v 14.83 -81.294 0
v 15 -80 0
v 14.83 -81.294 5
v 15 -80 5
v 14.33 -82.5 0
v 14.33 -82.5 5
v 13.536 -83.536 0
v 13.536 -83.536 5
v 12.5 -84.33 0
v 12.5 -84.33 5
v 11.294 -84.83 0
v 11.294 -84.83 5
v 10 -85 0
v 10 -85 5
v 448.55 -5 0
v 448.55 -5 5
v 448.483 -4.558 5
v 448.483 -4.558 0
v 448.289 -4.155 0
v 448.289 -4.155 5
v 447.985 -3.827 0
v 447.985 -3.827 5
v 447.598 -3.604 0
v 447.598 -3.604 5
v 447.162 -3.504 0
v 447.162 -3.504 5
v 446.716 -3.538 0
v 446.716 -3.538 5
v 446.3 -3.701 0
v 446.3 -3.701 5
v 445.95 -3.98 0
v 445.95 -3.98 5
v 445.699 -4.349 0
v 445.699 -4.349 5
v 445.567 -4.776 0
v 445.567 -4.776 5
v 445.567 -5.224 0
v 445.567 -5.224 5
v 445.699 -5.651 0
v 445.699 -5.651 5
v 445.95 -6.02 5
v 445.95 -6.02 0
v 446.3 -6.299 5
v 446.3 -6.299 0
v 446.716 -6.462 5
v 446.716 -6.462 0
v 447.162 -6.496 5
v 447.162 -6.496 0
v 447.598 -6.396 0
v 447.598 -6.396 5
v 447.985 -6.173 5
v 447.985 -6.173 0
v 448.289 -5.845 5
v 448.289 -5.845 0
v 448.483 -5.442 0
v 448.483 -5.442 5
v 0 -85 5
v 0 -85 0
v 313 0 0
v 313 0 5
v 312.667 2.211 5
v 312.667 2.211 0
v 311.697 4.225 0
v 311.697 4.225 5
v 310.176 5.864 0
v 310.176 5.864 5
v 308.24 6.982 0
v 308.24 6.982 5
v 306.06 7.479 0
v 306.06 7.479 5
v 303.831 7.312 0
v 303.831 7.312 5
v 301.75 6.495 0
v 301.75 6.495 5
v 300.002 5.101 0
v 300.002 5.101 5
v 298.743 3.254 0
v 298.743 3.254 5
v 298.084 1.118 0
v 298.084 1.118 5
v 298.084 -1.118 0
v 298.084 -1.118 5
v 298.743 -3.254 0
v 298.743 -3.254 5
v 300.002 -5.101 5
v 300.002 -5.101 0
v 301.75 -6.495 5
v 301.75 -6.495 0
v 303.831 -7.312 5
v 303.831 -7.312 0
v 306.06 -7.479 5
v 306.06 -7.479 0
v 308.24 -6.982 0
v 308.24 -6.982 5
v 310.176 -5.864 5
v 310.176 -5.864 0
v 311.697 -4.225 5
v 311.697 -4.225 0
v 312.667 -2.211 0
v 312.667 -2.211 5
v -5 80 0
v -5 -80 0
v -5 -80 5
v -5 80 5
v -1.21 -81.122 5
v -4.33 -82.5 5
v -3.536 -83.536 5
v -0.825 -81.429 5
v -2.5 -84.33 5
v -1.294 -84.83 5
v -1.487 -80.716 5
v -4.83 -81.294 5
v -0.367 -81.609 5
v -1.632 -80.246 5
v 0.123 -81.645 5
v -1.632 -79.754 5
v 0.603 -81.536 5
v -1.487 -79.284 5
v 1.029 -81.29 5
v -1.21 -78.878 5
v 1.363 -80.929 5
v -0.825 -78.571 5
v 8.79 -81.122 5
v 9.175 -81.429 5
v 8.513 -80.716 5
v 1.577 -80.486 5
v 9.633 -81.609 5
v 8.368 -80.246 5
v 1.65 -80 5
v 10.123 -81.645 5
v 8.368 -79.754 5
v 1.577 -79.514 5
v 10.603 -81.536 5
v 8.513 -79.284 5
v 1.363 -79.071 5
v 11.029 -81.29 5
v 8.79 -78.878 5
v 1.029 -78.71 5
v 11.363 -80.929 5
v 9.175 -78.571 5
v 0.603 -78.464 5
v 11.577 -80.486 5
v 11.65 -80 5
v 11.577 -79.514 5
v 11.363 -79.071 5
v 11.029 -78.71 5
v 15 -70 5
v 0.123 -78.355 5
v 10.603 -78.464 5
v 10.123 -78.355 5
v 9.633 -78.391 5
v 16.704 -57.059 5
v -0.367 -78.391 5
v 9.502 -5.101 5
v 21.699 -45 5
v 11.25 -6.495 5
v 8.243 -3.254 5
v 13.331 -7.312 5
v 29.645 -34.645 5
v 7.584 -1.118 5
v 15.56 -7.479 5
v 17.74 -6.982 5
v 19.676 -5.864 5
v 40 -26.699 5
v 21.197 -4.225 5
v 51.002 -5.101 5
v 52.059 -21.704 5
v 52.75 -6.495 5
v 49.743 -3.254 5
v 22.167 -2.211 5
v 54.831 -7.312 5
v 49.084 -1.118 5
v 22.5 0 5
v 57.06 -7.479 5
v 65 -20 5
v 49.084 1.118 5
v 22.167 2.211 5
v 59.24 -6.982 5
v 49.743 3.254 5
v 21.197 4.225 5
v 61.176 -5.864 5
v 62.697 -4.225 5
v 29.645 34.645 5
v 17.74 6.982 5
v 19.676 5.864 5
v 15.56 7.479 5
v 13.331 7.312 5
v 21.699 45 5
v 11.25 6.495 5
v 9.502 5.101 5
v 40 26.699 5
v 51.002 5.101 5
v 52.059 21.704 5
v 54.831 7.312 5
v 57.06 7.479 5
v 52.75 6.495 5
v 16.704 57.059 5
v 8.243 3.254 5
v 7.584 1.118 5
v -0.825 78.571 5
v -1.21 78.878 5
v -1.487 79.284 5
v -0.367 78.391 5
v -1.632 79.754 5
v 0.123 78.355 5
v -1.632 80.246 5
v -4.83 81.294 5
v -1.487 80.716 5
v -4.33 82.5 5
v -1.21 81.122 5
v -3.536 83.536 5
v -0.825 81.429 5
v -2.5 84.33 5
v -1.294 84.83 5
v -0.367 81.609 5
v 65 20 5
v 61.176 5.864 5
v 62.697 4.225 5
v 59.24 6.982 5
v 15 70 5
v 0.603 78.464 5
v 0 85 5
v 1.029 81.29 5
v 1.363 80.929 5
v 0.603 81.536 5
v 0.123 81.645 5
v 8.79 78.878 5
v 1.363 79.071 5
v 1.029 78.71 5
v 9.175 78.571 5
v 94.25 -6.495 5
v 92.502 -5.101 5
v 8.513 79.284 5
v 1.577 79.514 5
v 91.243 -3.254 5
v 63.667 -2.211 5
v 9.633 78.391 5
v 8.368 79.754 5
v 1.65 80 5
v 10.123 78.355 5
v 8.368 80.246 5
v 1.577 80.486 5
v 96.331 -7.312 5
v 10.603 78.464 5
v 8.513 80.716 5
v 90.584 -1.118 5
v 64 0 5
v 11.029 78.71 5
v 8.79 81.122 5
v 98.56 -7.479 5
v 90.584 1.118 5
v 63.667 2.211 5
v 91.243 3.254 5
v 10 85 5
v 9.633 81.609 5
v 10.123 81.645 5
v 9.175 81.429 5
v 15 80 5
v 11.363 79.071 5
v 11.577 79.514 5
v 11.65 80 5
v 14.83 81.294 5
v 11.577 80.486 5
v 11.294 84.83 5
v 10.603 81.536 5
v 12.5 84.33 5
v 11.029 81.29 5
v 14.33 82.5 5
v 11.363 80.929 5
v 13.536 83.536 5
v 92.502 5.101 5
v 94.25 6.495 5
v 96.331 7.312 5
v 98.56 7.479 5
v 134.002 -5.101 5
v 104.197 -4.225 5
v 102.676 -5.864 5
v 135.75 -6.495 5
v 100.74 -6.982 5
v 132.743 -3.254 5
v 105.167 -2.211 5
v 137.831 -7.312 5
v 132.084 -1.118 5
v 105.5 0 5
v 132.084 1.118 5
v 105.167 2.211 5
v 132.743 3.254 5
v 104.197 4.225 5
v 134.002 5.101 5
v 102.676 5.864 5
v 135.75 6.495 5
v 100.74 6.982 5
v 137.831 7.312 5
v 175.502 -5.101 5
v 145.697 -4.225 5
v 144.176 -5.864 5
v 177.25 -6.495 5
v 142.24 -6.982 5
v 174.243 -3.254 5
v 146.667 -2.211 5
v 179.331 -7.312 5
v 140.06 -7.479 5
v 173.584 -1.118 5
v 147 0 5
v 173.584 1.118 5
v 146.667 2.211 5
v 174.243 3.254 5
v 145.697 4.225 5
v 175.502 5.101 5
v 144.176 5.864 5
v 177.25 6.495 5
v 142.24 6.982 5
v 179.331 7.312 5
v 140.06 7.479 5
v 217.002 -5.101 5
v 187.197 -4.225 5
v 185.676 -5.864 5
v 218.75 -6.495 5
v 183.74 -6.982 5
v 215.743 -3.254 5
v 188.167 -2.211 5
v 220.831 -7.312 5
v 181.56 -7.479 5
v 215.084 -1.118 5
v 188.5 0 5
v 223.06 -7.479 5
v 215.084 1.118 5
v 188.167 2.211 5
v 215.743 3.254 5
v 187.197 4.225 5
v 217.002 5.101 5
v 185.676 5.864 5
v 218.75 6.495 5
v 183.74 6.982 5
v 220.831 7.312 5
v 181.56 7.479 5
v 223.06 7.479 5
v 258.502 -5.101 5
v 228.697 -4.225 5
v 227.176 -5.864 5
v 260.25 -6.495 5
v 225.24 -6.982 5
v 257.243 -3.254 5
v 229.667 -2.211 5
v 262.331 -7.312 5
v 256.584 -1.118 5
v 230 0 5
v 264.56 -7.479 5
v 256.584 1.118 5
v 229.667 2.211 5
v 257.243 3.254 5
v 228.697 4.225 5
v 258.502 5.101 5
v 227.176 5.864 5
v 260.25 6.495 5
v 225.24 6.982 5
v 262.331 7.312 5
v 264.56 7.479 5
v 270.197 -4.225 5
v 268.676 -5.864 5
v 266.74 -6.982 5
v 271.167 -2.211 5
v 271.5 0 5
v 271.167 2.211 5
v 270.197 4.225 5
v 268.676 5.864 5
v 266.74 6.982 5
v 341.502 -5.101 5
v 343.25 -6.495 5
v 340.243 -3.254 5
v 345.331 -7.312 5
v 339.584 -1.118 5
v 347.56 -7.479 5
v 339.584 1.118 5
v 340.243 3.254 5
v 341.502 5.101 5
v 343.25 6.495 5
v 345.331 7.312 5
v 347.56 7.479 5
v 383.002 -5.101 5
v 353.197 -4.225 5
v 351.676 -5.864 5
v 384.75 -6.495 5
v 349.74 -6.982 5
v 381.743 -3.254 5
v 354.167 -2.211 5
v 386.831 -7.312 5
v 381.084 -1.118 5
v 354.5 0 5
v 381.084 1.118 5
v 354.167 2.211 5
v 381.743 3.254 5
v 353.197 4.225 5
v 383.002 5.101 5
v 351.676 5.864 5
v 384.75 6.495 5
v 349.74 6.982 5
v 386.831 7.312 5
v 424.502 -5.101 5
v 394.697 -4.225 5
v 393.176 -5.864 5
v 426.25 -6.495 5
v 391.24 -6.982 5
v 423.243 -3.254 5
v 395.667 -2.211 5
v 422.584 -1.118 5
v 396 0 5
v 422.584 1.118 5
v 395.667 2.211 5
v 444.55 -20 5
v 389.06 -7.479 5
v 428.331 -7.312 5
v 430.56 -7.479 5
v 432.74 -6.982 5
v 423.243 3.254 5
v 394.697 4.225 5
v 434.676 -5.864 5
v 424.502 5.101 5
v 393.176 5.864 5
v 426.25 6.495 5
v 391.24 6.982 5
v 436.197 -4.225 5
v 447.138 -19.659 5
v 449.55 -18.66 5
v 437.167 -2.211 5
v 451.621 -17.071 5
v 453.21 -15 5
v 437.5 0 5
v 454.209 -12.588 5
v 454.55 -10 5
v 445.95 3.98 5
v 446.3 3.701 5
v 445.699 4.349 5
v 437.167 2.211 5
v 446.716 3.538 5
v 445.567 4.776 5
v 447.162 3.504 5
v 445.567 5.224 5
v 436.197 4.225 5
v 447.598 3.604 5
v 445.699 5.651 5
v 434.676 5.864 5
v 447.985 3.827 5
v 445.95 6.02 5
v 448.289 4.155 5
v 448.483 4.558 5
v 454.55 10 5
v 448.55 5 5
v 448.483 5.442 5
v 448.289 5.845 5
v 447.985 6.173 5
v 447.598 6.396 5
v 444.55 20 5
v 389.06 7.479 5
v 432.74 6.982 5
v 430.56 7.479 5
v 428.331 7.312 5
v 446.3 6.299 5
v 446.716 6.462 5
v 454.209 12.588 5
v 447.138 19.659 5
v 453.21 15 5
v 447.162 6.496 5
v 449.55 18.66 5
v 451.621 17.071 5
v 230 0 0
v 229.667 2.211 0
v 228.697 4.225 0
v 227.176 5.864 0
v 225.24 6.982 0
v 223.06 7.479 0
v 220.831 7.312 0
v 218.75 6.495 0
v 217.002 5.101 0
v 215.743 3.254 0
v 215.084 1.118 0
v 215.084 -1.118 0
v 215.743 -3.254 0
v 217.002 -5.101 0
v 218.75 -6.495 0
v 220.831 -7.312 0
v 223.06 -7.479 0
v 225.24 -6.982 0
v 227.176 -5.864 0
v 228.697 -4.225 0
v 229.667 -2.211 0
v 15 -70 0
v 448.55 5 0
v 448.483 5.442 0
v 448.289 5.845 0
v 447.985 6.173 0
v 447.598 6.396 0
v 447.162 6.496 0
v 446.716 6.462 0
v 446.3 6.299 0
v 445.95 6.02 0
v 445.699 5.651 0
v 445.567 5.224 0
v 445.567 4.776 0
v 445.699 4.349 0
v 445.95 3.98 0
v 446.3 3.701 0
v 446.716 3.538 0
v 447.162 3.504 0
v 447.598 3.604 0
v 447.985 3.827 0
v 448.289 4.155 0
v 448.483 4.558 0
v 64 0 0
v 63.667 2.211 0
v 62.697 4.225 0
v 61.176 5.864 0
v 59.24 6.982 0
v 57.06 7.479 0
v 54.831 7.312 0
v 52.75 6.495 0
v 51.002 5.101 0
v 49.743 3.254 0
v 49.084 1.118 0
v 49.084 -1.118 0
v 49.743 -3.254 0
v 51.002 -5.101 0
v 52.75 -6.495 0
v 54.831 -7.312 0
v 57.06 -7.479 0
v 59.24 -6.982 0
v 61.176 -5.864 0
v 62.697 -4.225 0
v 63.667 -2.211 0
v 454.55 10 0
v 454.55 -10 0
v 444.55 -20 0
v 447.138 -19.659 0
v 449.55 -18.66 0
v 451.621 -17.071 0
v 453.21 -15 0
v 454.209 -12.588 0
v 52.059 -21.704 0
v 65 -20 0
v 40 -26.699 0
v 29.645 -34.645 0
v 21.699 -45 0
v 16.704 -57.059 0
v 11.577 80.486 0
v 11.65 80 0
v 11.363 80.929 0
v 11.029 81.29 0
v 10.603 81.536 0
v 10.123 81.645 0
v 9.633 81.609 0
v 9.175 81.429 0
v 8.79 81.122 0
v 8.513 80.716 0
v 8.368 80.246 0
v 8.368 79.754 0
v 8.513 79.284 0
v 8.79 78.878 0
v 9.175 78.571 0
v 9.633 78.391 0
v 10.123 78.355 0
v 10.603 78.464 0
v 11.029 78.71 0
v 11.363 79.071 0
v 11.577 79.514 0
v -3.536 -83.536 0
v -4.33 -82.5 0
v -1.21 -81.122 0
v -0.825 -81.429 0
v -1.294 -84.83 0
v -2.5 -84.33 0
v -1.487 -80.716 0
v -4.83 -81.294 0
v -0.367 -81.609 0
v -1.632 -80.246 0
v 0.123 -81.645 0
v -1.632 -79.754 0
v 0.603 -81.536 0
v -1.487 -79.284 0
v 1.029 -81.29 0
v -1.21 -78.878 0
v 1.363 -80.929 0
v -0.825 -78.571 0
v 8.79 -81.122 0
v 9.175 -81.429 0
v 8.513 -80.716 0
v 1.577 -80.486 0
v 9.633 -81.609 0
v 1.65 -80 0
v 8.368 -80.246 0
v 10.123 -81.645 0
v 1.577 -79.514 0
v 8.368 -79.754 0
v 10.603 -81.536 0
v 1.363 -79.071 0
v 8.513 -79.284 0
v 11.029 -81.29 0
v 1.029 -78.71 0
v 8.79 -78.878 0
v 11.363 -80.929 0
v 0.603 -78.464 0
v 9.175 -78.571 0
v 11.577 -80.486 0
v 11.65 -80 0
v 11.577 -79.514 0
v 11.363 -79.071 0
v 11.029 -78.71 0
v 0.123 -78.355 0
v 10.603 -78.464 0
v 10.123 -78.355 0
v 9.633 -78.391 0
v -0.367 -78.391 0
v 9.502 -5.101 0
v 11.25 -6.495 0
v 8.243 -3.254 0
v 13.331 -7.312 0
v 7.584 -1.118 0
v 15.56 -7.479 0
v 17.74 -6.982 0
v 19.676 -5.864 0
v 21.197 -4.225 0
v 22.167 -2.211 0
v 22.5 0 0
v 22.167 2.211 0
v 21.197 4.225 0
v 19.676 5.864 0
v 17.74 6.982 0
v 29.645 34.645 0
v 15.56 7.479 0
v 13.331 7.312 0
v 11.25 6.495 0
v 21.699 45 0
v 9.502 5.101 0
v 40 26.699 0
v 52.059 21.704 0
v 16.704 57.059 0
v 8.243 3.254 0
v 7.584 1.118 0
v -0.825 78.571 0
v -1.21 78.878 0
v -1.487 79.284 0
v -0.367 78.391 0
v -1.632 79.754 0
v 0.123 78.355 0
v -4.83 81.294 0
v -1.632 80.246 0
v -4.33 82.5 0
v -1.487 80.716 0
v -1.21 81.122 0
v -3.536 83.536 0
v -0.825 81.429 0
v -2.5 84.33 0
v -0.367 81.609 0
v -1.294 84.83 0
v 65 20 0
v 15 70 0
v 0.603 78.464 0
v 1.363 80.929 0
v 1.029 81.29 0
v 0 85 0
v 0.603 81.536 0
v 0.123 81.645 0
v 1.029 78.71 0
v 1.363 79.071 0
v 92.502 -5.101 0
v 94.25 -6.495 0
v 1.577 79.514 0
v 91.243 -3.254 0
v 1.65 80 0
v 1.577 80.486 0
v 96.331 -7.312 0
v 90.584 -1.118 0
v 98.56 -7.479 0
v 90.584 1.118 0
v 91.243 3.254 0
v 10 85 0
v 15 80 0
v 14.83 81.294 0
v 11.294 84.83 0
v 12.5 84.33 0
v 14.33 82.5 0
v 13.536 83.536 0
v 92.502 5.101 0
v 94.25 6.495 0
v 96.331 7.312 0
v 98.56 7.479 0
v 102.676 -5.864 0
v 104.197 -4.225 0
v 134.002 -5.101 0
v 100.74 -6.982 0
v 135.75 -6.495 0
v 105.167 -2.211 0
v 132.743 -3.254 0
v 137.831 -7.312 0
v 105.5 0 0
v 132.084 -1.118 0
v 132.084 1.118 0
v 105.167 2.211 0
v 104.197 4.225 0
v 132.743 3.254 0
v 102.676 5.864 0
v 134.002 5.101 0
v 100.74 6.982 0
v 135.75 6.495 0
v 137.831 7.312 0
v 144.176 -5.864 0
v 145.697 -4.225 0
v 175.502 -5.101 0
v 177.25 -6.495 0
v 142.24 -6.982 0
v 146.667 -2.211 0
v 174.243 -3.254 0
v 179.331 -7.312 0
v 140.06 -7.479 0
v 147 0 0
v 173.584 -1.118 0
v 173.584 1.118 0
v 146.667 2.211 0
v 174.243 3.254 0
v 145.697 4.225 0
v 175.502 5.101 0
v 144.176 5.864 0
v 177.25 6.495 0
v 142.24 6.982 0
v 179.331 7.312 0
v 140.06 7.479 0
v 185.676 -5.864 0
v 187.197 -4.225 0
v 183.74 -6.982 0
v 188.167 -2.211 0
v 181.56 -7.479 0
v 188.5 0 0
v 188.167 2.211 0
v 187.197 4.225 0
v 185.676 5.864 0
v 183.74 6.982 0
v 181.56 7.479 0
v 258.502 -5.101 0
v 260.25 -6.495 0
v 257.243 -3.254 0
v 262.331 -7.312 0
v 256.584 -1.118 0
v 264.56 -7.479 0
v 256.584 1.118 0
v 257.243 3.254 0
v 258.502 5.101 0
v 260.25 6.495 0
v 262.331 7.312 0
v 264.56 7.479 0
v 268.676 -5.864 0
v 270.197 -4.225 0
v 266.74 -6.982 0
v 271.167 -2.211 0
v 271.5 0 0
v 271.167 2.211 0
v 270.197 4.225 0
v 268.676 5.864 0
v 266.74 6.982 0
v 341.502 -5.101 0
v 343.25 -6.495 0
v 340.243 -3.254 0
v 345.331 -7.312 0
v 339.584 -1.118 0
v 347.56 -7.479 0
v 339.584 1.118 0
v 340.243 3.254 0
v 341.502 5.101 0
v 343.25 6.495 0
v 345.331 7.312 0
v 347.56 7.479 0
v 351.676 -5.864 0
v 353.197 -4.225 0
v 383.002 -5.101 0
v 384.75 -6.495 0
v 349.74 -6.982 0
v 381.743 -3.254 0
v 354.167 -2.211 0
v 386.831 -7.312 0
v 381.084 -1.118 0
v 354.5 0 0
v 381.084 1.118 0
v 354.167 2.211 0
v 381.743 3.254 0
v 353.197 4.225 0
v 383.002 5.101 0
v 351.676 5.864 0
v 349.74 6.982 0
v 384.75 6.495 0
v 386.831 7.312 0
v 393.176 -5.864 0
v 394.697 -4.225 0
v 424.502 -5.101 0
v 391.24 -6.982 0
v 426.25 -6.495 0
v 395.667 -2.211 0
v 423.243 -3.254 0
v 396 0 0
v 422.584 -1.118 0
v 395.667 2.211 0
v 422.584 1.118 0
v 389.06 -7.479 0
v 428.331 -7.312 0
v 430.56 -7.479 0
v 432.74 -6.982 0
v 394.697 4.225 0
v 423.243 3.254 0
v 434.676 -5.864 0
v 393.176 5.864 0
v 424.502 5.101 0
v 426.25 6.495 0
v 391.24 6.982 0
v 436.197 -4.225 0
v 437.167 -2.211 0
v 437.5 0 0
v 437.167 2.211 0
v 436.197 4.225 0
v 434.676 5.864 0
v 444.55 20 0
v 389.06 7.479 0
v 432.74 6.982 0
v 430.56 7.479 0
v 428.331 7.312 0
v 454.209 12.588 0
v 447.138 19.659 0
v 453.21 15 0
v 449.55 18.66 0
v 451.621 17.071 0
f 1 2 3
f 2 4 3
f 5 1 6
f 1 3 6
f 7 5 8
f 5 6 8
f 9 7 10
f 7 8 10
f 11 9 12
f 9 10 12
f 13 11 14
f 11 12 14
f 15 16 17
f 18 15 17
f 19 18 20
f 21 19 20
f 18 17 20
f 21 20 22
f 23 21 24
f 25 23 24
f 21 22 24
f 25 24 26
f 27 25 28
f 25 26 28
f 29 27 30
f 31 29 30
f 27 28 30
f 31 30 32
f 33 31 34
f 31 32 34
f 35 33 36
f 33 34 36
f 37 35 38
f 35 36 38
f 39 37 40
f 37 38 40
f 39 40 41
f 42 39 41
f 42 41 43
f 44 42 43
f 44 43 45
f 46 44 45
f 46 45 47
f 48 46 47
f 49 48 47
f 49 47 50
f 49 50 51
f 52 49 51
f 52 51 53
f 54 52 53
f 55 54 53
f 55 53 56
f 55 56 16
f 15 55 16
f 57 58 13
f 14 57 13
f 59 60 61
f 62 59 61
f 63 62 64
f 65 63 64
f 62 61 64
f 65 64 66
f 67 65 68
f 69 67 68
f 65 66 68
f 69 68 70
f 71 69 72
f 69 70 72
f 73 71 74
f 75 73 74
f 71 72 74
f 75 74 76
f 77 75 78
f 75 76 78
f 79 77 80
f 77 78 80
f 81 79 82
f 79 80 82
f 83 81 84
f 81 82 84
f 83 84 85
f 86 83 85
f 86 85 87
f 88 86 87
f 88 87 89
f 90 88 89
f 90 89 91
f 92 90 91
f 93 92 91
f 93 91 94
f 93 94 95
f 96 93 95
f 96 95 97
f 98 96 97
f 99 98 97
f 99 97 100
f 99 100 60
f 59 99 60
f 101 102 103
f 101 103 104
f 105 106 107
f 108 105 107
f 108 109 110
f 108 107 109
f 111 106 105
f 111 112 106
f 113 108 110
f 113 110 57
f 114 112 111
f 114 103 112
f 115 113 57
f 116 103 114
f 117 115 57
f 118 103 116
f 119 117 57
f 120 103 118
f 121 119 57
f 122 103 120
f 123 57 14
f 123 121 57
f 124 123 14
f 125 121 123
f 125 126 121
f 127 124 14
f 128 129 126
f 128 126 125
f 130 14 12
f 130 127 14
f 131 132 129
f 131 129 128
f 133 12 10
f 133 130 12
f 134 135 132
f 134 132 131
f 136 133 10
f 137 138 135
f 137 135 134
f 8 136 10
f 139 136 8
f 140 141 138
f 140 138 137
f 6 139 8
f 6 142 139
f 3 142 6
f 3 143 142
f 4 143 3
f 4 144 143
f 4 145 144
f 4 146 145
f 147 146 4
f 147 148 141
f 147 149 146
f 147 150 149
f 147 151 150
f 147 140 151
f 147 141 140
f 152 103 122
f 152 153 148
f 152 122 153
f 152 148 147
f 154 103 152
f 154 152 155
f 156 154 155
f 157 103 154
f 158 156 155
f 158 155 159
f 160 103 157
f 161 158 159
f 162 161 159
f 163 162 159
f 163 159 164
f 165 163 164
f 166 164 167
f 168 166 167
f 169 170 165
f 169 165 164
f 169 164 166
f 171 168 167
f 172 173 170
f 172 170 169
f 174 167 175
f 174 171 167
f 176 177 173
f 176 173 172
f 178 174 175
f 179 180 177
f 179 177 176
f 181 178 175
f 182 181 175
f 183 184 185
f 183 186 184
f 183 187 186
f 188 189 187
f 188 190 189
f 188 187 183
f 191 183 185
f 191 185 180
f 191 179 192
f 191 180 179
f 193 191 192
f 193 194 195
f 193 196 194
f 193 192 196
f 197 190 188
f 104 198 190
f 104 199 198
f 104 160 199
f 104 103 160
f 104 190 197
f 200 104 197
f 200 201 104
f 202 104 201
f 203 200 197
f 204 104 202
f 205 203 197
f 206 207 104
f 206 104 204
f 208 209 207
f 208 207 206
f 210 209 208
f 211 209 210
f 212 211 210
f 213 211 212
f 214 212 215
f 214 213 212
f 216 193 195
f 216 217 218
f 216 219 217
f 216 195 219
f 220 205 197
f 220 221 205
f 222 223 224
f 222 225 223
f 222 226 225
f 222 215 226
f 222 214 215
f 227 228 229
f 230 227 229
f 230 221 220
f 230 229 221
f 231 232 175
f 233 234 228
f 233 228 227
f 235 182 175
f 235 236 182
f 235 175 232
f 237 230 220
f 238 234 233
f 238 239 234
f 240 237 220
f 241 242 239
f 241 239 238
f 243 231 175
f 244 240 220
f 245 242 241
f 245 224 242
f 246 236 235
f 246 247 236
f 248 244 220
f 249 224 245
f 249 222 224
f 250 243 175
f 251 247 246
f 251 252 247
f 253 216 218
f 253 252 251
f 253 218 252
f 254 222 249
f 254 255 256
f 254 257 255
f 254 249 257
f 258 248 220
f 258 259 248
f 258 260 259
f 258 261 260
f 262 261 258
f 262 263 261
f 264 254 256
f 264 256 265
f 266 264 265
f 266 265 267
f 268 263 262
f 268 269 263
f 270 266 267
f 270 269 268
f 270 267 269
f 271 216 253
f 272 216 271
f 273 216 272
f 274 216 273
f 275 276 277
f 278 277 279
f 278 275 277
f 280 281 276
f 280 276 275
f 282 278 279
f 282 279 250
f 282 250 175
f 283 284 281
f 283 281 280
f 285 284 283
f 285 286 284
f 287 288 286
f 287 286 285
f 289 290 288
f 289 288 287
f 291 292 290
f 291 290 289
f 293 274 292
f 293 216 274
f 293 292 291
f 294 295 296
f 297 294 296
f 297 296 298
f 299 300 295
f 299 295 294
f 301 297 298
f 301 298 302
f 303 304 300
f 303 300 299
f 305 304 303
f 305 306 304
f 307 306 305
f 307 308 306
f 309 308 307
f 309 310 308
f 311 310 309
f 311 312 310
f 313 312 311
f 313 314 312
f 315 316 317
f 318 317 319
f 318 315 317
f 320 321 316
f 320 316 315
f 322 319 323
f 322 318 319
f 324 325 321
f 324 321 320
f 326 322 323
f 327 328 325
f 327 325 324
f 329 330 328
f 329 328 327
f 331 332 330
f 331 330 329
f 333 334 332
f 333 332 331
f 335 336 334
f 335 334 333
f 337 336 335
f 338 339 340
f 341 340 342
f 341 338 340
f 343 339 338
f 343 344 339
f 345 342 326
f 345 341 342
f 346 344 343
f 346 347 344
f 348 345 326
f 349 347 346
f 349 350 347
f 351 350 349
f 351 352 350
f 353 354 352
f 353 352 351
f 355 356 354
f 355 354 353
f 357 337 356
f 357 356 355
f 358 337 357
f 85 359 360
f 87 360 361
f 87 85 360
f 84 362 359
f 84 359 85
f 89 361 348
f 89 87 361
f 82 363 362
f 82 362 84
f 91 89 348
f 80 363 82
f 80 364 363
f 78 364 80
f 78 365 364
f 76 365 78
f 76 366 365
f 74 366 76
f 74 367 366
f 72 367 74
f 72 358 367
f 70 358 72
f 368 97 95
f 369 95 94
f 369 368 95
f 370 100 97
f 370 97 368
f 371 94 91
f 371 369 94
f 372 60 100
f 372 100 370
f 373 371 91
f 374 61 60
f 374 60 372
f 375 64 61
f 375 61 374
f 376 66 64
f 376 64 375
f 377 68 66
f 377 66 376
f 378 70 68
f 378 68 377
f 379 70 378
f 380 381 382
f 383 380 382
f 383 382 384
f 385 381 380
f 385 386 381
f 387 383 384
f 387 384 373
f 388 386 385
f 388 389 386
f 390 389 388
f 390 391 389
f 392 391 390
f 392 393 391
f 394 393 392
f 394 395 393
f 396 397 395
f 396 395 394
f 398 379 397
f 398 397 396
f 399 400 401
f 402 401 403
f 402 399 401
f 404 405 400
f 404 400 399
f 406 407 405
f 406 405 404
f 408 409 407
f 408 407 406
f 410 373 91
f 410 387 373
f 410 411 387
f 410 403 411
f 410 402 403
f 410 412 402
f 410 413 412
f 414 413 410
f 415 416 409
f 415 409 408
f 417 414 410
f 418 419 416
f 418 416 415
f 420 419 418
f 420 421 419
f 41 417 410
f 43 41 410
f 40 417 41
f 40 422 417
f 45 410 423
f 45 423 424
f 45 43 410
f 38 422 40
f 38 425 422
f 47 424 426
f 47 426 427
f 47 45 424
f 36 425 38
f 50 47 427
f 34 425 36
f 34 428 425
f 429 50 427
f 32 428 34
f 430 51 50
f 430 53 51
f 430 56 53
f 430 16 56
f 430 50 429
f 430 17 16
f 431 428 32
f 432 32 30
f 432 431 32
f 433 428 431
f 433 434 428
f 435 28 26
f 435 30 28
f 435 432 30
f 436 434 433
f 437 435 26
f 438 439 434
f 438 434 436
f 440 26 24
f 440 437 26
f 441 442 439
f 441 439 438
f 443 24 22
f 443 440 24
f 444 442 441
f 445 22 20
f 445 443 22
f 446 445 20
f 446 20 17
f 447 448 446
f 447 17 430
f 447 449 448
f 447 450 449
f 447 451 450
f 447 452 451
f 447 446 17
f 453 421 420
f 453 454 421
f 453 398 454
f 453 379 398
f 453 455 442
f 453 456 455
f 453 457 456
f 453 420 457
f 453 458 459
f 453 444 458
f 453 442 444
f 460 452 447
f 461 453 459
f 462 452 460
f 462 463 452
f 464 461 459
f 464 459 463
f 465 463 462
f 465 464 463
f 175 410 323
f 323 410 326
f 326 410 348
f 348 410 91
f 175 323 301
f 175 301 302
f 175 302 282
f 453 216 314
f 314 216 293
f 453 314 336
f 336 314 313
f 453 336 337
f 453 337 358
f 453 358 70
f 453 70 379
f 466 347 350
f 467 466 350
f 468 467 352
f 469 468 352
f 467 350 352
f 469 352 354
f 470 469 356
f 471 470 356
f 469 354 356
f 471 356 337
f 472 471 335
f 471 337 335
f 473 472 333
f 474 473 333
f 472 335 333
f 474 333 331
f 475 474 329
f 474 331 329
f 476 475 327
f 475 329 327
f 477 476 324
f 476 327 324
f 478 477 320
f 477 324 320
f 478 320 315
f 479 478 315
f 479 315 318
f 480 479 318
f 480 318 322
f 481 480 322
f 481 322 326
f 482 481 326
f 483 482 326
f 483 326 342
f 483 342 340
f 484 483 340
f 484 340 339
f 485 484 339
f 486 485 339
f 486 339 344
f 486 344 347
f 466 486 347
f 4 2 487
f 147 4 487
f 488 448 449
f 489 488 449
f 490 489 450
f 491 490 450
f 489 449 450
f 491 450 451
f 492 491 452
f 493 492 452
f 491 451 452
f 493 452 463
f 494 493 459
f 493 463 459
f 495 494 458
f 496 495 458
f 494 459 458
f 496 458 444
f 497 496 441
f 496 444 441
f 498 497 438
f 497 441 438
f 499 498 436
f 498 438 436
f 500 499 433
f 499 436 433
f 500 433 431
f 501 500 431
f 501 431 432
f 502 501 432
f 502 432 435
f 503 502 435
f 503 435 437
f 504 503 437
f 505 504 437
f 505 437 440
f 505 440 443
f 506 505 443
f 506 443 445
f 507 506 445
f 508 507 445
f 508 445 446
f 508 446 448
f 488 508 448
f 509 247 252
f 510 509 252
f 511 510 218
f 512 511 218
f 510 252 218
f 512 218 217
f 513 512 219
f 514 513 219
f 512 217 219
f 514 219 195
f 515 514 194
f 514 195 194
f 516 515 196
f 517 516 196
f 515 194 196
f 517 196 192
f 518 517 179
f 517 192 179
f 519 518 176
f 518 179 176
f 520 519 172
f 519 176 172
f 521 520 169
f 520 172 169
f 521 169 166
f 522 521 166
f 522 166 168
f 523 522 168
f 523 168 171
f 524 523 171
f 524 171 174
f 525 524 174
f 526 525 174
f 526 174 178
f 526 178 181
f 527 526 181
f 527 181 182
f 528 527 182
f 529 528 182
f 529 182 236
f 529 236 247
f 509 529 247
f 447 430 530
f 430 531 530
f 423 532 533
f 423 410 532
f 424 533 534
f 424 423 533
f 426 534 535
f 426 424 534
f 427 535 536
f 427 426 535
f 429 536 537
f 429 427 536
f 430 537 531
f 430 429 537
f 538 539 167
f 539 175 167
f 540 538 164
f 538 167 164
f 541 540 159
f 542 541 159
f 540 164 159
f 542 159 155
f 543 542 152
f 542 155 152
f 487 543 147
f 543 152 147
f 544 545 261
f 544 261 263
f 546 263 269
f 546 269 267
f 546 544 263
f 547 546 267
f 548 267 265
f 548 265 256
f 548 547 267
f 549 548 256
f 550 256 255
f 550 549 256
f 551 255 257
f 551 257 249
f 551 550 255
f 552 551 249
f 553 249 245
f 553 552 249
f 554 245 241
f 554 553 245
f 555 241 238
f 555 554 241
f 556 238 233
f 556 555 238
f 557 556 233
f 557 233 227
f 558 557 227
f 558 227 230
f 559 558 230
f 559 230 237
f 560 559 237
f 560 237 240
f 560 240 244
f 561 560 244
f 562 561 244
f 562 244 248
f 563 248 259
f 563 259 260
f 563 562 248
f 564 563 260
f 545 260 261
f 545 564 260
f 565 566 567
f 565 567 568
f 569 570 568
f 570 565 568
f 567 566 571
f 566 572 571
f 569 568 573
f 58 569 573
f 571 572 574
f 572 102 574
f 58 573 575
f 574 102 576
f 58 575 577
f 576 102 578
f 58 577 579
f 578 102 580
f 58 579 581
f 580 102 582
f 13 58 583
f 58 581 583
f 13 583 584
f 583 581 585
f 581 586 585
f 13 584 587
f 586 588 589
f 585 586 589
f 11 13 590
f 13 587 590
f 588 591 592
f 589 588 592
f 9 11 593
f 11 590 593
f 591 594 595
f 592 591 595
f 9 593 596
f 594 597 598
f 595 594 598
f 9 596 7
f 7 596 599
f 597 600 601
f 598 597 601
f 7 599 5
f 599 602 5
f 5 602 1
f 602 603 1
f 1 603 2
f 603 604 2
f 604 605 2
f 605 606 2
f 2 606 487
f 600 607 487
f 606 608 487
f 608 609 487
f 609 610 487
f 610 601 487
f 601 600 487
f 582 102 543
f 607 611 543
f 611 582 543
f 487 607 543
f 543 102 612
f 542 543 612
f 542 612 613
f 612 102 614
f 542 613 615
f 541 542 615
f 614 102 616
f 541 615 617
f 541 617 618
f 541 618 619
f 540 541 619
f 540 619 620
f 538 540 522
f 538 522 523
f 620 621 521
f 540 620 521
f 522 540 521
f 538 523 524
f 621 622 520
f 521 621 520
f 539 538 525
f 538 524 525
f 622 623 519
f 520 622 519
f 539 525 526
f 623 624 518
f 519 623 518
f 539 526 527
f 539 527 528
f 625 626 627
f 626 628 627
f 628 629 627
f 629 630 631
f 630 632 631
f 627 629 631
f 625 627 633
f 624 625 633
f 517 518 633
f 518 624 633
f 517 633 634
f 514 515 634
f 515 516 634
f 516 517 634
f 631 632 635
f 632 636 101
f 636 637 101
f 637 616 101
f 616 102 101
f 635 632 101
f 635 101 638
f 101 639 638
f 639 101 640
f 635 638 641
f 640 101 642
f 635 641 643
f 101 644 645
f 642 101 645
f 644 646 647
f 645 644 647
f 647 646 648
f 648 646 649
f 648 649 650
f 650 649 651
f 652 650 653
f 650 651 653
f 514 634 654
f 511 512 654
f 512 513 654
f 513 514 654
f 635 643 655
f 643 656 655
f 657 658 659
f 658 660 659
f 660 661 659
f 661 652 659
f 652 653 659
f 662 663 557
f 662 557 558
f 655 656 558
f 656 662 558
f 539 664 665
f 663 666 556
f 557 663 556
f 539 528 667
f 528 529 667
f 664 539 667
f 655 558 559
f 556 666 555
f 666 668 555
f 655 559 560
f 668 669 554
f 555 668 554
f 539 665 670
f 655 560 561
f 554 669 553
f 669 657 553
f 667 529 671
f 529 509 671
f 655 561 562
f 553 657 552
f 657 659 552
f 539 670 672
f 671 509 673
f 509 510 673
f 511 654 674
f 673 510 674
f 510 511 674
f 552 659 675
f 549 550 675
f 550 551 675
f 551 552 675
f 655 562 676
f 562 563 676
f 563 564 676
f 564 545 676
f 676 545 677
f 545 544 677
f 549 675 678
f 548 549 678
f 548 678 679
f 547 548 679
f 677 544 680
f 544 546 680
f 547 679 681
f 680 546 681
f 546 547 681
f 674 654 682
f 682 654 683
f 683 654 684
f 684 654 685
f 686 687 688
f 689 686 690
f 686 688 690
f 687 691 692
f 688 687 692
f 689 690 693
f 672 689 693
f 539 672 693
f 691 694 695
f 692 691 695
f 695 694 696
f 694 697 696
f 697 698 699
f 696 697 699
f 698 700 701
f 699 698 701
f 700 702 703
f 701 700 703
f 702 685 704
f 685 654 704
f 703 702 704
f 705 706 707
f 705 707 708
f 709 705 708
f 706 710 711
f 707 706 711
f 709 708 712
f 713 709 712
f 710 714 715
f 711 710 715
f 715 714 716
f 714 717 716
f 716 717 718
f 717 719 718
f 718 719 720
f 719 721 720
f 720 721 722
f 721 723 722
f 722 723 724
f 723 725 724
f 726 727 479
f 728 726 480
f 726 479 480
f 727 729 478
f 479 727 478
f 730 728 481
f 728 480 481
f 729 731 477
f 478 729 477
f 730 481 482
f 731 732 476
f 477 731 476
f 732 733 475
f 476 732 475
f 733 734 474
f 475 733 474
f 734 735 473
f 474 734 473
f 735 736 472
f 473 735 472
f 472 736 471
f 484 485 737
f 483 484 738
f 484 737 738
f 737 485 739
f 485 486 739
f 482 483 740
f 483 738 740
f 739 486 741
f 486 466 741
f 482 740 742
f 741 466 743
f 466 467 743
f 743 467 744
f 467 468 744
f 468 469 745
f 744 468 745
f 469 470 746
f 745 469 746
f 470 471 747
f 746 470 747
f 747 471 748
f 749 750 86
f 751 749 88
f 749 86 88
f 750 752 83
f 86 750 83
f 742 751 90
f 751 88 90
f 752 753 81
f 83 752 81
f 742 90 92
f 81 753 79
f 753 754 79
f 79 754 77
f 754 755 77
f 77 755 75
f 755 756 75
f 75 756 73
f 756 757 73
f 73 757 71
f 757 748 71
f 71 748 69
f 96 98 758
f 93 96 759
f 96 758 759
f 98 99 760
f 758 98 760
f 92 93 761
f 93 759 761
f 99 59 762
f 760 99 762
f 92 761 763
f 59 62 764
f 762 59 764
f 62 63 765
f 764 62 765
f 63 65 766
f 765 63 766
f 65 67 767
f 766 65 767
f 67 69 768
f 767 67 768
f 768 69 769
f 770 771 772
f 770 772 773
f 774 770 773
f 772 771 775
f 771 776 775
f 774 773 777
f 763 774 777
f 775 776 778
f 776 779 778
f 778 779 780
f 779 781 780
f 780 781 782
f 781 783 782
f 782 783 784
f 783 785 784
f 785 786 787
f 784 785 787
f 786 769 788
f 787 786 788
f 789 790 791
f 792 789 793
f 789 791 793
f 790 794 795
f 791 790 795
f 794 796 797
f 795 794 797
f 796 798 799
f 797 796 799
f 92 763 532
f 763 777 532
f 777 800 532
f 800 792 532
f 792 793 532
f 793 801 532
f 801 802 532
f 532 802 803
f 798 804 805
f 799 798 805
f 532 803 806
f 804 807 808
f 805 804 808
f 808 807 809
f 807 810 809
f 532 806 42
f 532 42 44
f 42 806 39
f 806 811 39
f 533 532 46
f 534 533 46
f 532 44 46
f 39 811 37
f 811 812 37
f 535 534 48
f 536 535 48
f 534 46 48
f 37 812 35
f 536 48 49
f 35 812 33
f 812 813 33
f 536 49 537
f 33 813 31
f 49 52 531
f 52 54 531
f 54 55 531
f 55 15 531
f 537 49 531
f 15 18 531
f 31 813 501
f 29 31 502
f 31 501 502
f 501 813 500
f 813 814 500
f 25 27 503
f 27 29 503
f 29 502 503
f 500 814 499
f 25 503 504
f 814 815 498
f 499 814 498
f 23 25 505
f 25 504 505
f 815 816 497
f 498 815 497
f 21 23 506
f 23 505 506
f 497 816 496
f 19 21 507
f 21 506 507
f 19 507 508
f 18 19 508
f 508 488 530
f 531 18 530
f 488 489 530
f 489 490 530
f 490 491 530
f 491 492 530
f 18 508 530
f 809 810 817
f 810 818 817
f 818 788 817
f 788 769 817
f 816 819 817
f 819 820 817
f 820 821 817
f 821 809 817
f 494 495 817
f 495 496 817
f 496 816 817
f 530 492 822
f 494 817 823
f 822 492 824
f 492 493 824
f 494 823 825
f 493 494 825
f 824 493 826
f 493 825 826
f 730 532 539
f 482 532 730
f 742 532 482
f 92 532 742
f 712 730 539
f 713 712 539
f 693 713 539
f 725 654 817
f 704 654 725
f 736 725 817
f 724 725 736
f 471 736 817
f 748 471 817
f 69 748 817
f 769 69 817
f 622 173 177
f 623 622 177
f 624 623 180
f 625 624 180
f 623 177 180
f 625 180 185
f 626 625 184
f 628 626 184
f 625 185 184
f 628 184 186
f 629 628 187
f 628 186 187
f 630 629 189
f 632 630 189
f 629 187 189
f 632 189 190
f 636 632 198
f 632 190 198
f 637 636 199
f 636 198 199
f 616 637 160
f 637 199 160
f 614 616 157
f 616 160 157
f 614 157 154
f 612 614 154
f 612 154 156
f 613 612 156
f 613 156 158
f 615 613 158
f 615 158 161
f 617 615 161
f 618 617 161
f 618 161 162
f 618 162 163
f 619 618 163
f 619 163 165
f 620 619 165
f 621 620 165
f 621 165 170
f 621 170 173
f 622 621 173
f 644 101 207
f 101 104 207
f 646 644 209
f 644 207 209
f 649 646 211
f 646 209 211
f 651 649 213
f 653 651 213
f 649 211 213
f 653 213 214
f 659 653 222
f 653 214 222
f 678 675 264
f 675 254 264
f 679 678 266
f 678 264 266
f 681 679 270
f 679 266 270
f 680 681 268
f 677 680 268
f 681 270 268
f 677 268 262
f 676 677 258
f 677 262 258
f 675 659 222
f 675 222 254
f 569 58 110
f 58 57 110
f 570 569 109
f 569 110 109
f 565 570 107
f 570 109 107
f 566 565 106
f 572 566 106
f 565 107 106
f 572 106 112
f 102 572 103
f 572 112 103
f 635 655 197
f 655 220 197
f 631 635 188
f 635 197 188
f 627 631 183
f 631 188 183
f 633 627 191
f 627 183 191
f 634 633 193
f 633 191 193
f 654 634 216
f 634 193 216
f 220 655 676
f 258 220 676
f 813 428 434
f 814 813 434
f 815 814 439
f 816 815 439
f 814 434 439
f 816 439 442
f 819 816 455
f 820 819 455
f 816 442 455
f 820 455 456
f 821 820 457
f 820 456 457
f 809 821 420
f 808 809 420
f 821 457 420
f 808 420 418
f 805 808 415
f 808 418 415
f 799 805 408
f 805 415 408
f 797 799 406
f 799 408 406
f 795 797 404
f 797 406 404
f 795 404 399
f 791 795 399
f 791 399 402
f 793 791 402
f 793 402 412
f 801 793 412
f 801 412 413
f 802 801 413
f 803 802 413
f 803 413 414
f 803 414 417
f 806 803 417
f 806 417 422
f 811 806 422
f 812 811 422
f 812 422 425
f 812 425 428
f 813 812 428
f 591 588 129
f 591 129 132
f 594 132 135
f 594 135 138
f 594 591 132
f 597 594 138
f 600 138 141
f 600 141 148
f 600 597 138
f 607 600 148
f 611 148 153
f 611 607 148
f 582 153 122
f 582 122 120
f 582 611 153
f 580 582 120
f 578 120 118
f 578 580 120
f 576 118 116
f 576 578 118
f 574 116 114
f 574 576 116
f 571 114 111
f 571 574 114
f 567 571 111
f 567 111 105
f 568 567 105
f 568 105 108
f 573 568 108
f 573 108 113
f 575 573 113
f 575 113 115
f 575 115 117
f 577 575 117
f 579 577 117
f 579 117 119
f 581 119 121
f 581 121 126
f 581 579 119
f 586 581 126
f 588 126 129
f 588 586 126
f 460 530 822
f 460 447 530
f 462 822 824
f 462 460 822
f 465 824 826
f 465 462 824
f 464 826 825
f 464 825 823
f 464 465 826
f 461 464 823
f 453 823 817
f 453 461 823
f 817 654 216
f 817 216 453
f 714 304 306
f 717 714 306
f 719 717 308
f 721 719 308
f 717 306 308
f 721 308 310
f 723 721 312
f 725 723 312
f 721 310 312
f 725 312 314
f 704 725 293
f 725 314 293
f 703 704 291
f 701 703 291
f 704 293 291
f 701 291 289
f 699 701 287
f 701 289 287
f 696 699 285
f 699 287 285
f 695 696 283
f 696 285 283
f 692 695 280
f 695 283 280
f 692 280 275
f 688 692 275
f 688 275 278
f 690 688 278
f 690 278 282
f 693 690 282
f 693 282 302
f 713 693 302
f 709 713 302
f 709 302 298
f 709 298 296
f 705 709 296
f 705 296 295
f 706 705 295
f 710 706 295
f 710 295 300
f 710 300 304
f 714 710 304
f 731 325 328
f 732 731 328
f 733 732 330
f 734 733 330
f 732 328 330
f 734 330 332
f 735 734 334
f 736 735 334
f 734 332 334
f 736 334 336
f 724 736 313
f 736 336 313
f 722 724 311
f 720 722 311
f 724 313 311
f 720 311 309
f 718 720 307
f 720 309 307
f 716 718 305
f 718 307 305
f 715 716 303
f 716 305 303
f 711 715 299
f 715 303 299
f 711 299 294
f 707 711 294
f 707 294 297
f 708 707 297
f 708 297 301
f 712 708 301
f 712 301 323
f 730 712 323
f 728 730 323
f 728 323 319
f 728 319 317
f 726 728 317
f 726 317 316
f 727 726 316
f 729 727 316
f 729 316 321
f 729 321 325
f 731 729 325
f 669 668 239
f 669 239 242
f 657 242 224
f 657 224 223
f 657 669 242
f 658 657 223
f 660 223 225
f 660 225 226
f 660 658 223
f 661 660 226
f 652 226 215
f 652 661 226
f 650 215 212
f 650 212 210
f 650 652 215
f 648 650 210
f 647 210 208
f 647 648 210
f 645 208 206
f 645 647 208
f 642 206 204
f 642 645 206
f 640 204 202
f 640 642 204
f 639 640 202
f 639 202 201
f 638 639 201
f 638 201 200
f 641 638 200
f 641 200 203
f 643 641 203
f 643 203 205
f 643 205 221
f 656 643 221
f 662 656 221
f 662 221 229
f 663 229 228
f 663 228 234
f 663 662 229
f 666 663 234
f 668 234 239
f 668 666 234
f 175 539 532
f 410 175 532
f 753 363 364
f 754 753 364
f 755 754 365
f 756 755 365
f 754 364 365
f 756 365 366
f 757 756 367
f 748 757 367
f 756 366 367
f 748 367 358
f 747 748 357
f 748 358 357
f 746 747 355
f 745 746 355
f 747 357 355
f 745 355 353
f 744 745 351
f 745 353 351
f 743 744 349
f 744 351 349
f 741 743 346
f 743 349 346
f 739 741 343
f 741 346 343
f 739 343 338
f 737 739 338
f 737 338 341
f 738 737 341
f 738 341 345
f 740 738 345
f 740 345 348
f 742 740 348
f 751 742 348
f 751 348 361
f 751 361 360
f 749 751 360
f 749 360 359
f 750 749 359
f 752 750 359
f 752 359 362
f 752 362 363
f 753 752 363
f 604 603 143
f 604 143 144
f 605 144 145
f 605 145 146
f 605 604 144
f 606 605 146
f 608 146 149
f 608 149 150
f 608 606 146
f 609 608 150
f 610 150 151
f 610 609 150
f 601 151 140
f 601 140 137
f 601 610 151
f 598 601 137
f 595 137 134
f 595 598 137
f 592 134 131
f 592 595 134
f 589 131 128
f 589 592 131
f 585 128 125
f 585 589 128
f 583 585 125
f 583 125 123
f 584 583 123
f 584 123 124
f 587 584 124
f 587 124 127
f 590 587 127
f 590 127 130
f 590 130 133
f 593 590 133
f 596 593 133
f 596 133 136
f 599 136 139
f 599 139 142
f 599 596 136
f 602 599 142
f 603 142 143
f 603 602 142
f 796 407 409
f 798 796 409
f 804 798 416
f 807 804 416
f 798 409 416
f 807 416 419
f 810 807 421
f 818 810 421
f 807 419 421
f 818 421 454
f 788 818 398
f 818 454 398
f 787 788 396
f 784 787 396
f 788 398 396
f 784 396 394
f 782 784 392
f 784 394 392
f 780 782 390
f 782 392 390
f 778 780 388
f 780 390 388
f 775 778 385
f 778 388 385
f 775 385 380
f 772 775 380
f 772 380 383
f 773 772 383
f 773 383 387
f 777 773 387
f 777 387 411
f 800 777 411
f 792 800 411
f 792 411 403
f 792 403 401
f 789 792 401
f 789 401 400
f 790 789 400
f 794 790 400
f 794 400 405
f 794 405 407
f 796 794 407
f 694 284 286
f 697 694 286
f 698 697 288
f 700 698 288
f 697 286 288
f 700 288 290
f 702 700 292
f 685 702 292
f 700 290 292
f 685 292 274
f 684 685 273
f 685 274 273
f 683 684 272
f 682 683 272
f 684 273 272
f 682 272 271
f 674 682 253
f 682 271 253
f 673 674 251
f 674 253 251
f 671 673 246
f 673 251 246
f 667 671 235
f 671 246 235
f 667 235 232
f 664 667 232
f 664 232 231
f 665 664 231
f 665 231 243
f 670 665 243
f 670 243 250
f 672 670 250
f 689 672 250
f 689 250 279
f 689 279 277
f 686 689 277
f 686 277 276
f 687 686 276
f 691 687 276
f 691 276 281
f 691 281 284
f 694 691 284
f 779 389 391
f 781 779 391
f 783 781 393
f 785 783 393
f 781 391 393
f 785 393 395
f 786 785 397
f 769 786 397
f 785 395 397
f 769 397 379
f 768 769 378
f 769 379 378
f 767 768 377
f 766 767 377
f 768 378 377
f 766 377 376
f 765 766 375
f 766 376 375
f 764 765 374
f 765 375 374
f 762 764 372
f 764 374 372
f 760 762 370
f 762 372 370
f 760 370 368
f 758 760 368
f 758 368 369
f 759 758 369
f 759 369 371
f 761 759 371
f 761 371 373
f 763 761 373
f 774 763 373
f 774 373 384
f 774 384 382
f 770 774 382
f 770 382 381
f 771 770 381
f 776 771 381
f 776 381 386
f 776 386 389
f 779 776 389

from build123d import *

# Parameters (mm, degrees)
SKETCH_1_W          = 439.55
SKETCH_1_H          = 20
SKETCH_1_W_2        = 20
SKETCH_1_H_2        = 170
SKETCH_1_R          = 1.65
EXTRUDE_1_DEPTH     = 5
FILLET_1_R          = 50
FILLET_2_R          = 5
SKETCH_2_R          = 1.5
CUT_EXTRUDE_1_DEPTH = 10
FILLET_3_R          = 10
SKETCH_3_R          = 7.5
CUT_EXTRUDE_2_DEPTH = 10


with BuildPart() as part:
    # ｽｹｯﾁ1 → ﾎﾞｽ - 押し出し1 (new body)
    # profile 1 of 3: a face of its own
    with BuildSketch(Plane.XY):
        with Locations((234.775, 10)):
            Rectangle(SKETCH_1_W, SKETCH_1_H)
    # profile 2 of 3: a face of its own
    with BuildSketch(Plane.XY):
        with Locations((234.775, -10)):
            Rectangle(SKETCH_1_W, SKETCH_1_H)
    # profile 3 of 3: a face of its own
    with BuildSketch(Plane.XY):
        with Locations((5, 0)):
            Rectangle(SKETCH_1_W_2, SKETCH_1_H_2)
        with Locations((10, -80)):
            Circle(SKETCH_1_R, mode=Mode.SUBTRACT)
        with Locations((10, 80)):
            Circle(SKETCH_1_R, mode=Mode.SUBTRACT)
        with Locations((0, 80)):
            Circle(SKETCH_1_R, mode=Mode.SUBTRACT)
        with Locations((0, -80)):
            Circle(SKETCH_1_R, mode=Mode.SUBTRACT)
    extrude(amount=EXTRUDE_1_DEPTH)

    # ﾌｨﾚｯﾄ1
    fillet_1_edges = [part.edges().sort_by_distance(p)[0] for p in [
        (15, 20, 2.5),
        (15, -20, 2.5),
    ]]
    fillet(fillet_1_edges, radius=FILLET_1_R)

    # ﾌｨﾚｯﾄ2
    fillet_2_edges = [part.edges().sort_by_distance(p)[0] for p in [
        (15, -85, 2.5),
        (-5, -85, 2.5),
        (-5, 85, 2.5),
        (15, 85, 2.5),
    ]]
    fillet(fillet_2_edges, radius=FILLET_2_R)

    # ｽｹｯﾁ2 → ｶｯﾄ - 押し出し1 (cut)
    with BuildSketch(Plane.XY.offset(5)):
        with Locations((447.05, 5)):
            Circle(SKETCH_2_R)
        with Locations((447.05, -5)):
            Circle(SKETCH_2_R)
    extrude(amount=-CUT_EXTRUDE_1_DEPTH, mode=Mode.SUBTRACT)

    # ﾌｨﾚｯﾄ3
    fillet_3_edges = [part.edges().sort_by_distance(p)[0] for p in [
        (454.55, 20, 2.5),
        (454.55, -20, 2.5),
    ]]
    fillet(fillet_3_edges, radius=FILLET_3_R)

    # ｽｹｯﾁ3 → ｶｯﾄ - 押し出し2 (cut)
    with BuildSketch(Plane.XY.offset(5)):
        with Locations((15, 0)):
            Circle(SKETCH_3_R)
        with Locations((56.5, 0)):
            Circle(SKETCH_3_R)
        with Locations((98, 0)):
            Circle(SKETCH_3_R)
        with Locations((139.5, 0)):
            Circle(SKETCH_3_R)
        with Locations((181, 0)):
            Circle(SKETCH_3_R)
        with Locations((222.5, 0)):
            Circle(SKETCH_3_R)
        with Locations((264, 0)):
            Circle(SKETCH_3_R)
        with Locations((305.5, 0)):
            Circle(SKETCH_3_R)
        with Locations((347, 0)):
            Circle(SKETCH_3_R)
        with Locations((388.5, 0)):
            Circle(SKETCH_3_R)
        with Locations((430, 0)):
            Circle(SKETCH_3_R)
    extrude(amount=-CUT_EXTRUDE_2_DEPTH, mode=Mode.SUBTRACT)


solid = part.part
